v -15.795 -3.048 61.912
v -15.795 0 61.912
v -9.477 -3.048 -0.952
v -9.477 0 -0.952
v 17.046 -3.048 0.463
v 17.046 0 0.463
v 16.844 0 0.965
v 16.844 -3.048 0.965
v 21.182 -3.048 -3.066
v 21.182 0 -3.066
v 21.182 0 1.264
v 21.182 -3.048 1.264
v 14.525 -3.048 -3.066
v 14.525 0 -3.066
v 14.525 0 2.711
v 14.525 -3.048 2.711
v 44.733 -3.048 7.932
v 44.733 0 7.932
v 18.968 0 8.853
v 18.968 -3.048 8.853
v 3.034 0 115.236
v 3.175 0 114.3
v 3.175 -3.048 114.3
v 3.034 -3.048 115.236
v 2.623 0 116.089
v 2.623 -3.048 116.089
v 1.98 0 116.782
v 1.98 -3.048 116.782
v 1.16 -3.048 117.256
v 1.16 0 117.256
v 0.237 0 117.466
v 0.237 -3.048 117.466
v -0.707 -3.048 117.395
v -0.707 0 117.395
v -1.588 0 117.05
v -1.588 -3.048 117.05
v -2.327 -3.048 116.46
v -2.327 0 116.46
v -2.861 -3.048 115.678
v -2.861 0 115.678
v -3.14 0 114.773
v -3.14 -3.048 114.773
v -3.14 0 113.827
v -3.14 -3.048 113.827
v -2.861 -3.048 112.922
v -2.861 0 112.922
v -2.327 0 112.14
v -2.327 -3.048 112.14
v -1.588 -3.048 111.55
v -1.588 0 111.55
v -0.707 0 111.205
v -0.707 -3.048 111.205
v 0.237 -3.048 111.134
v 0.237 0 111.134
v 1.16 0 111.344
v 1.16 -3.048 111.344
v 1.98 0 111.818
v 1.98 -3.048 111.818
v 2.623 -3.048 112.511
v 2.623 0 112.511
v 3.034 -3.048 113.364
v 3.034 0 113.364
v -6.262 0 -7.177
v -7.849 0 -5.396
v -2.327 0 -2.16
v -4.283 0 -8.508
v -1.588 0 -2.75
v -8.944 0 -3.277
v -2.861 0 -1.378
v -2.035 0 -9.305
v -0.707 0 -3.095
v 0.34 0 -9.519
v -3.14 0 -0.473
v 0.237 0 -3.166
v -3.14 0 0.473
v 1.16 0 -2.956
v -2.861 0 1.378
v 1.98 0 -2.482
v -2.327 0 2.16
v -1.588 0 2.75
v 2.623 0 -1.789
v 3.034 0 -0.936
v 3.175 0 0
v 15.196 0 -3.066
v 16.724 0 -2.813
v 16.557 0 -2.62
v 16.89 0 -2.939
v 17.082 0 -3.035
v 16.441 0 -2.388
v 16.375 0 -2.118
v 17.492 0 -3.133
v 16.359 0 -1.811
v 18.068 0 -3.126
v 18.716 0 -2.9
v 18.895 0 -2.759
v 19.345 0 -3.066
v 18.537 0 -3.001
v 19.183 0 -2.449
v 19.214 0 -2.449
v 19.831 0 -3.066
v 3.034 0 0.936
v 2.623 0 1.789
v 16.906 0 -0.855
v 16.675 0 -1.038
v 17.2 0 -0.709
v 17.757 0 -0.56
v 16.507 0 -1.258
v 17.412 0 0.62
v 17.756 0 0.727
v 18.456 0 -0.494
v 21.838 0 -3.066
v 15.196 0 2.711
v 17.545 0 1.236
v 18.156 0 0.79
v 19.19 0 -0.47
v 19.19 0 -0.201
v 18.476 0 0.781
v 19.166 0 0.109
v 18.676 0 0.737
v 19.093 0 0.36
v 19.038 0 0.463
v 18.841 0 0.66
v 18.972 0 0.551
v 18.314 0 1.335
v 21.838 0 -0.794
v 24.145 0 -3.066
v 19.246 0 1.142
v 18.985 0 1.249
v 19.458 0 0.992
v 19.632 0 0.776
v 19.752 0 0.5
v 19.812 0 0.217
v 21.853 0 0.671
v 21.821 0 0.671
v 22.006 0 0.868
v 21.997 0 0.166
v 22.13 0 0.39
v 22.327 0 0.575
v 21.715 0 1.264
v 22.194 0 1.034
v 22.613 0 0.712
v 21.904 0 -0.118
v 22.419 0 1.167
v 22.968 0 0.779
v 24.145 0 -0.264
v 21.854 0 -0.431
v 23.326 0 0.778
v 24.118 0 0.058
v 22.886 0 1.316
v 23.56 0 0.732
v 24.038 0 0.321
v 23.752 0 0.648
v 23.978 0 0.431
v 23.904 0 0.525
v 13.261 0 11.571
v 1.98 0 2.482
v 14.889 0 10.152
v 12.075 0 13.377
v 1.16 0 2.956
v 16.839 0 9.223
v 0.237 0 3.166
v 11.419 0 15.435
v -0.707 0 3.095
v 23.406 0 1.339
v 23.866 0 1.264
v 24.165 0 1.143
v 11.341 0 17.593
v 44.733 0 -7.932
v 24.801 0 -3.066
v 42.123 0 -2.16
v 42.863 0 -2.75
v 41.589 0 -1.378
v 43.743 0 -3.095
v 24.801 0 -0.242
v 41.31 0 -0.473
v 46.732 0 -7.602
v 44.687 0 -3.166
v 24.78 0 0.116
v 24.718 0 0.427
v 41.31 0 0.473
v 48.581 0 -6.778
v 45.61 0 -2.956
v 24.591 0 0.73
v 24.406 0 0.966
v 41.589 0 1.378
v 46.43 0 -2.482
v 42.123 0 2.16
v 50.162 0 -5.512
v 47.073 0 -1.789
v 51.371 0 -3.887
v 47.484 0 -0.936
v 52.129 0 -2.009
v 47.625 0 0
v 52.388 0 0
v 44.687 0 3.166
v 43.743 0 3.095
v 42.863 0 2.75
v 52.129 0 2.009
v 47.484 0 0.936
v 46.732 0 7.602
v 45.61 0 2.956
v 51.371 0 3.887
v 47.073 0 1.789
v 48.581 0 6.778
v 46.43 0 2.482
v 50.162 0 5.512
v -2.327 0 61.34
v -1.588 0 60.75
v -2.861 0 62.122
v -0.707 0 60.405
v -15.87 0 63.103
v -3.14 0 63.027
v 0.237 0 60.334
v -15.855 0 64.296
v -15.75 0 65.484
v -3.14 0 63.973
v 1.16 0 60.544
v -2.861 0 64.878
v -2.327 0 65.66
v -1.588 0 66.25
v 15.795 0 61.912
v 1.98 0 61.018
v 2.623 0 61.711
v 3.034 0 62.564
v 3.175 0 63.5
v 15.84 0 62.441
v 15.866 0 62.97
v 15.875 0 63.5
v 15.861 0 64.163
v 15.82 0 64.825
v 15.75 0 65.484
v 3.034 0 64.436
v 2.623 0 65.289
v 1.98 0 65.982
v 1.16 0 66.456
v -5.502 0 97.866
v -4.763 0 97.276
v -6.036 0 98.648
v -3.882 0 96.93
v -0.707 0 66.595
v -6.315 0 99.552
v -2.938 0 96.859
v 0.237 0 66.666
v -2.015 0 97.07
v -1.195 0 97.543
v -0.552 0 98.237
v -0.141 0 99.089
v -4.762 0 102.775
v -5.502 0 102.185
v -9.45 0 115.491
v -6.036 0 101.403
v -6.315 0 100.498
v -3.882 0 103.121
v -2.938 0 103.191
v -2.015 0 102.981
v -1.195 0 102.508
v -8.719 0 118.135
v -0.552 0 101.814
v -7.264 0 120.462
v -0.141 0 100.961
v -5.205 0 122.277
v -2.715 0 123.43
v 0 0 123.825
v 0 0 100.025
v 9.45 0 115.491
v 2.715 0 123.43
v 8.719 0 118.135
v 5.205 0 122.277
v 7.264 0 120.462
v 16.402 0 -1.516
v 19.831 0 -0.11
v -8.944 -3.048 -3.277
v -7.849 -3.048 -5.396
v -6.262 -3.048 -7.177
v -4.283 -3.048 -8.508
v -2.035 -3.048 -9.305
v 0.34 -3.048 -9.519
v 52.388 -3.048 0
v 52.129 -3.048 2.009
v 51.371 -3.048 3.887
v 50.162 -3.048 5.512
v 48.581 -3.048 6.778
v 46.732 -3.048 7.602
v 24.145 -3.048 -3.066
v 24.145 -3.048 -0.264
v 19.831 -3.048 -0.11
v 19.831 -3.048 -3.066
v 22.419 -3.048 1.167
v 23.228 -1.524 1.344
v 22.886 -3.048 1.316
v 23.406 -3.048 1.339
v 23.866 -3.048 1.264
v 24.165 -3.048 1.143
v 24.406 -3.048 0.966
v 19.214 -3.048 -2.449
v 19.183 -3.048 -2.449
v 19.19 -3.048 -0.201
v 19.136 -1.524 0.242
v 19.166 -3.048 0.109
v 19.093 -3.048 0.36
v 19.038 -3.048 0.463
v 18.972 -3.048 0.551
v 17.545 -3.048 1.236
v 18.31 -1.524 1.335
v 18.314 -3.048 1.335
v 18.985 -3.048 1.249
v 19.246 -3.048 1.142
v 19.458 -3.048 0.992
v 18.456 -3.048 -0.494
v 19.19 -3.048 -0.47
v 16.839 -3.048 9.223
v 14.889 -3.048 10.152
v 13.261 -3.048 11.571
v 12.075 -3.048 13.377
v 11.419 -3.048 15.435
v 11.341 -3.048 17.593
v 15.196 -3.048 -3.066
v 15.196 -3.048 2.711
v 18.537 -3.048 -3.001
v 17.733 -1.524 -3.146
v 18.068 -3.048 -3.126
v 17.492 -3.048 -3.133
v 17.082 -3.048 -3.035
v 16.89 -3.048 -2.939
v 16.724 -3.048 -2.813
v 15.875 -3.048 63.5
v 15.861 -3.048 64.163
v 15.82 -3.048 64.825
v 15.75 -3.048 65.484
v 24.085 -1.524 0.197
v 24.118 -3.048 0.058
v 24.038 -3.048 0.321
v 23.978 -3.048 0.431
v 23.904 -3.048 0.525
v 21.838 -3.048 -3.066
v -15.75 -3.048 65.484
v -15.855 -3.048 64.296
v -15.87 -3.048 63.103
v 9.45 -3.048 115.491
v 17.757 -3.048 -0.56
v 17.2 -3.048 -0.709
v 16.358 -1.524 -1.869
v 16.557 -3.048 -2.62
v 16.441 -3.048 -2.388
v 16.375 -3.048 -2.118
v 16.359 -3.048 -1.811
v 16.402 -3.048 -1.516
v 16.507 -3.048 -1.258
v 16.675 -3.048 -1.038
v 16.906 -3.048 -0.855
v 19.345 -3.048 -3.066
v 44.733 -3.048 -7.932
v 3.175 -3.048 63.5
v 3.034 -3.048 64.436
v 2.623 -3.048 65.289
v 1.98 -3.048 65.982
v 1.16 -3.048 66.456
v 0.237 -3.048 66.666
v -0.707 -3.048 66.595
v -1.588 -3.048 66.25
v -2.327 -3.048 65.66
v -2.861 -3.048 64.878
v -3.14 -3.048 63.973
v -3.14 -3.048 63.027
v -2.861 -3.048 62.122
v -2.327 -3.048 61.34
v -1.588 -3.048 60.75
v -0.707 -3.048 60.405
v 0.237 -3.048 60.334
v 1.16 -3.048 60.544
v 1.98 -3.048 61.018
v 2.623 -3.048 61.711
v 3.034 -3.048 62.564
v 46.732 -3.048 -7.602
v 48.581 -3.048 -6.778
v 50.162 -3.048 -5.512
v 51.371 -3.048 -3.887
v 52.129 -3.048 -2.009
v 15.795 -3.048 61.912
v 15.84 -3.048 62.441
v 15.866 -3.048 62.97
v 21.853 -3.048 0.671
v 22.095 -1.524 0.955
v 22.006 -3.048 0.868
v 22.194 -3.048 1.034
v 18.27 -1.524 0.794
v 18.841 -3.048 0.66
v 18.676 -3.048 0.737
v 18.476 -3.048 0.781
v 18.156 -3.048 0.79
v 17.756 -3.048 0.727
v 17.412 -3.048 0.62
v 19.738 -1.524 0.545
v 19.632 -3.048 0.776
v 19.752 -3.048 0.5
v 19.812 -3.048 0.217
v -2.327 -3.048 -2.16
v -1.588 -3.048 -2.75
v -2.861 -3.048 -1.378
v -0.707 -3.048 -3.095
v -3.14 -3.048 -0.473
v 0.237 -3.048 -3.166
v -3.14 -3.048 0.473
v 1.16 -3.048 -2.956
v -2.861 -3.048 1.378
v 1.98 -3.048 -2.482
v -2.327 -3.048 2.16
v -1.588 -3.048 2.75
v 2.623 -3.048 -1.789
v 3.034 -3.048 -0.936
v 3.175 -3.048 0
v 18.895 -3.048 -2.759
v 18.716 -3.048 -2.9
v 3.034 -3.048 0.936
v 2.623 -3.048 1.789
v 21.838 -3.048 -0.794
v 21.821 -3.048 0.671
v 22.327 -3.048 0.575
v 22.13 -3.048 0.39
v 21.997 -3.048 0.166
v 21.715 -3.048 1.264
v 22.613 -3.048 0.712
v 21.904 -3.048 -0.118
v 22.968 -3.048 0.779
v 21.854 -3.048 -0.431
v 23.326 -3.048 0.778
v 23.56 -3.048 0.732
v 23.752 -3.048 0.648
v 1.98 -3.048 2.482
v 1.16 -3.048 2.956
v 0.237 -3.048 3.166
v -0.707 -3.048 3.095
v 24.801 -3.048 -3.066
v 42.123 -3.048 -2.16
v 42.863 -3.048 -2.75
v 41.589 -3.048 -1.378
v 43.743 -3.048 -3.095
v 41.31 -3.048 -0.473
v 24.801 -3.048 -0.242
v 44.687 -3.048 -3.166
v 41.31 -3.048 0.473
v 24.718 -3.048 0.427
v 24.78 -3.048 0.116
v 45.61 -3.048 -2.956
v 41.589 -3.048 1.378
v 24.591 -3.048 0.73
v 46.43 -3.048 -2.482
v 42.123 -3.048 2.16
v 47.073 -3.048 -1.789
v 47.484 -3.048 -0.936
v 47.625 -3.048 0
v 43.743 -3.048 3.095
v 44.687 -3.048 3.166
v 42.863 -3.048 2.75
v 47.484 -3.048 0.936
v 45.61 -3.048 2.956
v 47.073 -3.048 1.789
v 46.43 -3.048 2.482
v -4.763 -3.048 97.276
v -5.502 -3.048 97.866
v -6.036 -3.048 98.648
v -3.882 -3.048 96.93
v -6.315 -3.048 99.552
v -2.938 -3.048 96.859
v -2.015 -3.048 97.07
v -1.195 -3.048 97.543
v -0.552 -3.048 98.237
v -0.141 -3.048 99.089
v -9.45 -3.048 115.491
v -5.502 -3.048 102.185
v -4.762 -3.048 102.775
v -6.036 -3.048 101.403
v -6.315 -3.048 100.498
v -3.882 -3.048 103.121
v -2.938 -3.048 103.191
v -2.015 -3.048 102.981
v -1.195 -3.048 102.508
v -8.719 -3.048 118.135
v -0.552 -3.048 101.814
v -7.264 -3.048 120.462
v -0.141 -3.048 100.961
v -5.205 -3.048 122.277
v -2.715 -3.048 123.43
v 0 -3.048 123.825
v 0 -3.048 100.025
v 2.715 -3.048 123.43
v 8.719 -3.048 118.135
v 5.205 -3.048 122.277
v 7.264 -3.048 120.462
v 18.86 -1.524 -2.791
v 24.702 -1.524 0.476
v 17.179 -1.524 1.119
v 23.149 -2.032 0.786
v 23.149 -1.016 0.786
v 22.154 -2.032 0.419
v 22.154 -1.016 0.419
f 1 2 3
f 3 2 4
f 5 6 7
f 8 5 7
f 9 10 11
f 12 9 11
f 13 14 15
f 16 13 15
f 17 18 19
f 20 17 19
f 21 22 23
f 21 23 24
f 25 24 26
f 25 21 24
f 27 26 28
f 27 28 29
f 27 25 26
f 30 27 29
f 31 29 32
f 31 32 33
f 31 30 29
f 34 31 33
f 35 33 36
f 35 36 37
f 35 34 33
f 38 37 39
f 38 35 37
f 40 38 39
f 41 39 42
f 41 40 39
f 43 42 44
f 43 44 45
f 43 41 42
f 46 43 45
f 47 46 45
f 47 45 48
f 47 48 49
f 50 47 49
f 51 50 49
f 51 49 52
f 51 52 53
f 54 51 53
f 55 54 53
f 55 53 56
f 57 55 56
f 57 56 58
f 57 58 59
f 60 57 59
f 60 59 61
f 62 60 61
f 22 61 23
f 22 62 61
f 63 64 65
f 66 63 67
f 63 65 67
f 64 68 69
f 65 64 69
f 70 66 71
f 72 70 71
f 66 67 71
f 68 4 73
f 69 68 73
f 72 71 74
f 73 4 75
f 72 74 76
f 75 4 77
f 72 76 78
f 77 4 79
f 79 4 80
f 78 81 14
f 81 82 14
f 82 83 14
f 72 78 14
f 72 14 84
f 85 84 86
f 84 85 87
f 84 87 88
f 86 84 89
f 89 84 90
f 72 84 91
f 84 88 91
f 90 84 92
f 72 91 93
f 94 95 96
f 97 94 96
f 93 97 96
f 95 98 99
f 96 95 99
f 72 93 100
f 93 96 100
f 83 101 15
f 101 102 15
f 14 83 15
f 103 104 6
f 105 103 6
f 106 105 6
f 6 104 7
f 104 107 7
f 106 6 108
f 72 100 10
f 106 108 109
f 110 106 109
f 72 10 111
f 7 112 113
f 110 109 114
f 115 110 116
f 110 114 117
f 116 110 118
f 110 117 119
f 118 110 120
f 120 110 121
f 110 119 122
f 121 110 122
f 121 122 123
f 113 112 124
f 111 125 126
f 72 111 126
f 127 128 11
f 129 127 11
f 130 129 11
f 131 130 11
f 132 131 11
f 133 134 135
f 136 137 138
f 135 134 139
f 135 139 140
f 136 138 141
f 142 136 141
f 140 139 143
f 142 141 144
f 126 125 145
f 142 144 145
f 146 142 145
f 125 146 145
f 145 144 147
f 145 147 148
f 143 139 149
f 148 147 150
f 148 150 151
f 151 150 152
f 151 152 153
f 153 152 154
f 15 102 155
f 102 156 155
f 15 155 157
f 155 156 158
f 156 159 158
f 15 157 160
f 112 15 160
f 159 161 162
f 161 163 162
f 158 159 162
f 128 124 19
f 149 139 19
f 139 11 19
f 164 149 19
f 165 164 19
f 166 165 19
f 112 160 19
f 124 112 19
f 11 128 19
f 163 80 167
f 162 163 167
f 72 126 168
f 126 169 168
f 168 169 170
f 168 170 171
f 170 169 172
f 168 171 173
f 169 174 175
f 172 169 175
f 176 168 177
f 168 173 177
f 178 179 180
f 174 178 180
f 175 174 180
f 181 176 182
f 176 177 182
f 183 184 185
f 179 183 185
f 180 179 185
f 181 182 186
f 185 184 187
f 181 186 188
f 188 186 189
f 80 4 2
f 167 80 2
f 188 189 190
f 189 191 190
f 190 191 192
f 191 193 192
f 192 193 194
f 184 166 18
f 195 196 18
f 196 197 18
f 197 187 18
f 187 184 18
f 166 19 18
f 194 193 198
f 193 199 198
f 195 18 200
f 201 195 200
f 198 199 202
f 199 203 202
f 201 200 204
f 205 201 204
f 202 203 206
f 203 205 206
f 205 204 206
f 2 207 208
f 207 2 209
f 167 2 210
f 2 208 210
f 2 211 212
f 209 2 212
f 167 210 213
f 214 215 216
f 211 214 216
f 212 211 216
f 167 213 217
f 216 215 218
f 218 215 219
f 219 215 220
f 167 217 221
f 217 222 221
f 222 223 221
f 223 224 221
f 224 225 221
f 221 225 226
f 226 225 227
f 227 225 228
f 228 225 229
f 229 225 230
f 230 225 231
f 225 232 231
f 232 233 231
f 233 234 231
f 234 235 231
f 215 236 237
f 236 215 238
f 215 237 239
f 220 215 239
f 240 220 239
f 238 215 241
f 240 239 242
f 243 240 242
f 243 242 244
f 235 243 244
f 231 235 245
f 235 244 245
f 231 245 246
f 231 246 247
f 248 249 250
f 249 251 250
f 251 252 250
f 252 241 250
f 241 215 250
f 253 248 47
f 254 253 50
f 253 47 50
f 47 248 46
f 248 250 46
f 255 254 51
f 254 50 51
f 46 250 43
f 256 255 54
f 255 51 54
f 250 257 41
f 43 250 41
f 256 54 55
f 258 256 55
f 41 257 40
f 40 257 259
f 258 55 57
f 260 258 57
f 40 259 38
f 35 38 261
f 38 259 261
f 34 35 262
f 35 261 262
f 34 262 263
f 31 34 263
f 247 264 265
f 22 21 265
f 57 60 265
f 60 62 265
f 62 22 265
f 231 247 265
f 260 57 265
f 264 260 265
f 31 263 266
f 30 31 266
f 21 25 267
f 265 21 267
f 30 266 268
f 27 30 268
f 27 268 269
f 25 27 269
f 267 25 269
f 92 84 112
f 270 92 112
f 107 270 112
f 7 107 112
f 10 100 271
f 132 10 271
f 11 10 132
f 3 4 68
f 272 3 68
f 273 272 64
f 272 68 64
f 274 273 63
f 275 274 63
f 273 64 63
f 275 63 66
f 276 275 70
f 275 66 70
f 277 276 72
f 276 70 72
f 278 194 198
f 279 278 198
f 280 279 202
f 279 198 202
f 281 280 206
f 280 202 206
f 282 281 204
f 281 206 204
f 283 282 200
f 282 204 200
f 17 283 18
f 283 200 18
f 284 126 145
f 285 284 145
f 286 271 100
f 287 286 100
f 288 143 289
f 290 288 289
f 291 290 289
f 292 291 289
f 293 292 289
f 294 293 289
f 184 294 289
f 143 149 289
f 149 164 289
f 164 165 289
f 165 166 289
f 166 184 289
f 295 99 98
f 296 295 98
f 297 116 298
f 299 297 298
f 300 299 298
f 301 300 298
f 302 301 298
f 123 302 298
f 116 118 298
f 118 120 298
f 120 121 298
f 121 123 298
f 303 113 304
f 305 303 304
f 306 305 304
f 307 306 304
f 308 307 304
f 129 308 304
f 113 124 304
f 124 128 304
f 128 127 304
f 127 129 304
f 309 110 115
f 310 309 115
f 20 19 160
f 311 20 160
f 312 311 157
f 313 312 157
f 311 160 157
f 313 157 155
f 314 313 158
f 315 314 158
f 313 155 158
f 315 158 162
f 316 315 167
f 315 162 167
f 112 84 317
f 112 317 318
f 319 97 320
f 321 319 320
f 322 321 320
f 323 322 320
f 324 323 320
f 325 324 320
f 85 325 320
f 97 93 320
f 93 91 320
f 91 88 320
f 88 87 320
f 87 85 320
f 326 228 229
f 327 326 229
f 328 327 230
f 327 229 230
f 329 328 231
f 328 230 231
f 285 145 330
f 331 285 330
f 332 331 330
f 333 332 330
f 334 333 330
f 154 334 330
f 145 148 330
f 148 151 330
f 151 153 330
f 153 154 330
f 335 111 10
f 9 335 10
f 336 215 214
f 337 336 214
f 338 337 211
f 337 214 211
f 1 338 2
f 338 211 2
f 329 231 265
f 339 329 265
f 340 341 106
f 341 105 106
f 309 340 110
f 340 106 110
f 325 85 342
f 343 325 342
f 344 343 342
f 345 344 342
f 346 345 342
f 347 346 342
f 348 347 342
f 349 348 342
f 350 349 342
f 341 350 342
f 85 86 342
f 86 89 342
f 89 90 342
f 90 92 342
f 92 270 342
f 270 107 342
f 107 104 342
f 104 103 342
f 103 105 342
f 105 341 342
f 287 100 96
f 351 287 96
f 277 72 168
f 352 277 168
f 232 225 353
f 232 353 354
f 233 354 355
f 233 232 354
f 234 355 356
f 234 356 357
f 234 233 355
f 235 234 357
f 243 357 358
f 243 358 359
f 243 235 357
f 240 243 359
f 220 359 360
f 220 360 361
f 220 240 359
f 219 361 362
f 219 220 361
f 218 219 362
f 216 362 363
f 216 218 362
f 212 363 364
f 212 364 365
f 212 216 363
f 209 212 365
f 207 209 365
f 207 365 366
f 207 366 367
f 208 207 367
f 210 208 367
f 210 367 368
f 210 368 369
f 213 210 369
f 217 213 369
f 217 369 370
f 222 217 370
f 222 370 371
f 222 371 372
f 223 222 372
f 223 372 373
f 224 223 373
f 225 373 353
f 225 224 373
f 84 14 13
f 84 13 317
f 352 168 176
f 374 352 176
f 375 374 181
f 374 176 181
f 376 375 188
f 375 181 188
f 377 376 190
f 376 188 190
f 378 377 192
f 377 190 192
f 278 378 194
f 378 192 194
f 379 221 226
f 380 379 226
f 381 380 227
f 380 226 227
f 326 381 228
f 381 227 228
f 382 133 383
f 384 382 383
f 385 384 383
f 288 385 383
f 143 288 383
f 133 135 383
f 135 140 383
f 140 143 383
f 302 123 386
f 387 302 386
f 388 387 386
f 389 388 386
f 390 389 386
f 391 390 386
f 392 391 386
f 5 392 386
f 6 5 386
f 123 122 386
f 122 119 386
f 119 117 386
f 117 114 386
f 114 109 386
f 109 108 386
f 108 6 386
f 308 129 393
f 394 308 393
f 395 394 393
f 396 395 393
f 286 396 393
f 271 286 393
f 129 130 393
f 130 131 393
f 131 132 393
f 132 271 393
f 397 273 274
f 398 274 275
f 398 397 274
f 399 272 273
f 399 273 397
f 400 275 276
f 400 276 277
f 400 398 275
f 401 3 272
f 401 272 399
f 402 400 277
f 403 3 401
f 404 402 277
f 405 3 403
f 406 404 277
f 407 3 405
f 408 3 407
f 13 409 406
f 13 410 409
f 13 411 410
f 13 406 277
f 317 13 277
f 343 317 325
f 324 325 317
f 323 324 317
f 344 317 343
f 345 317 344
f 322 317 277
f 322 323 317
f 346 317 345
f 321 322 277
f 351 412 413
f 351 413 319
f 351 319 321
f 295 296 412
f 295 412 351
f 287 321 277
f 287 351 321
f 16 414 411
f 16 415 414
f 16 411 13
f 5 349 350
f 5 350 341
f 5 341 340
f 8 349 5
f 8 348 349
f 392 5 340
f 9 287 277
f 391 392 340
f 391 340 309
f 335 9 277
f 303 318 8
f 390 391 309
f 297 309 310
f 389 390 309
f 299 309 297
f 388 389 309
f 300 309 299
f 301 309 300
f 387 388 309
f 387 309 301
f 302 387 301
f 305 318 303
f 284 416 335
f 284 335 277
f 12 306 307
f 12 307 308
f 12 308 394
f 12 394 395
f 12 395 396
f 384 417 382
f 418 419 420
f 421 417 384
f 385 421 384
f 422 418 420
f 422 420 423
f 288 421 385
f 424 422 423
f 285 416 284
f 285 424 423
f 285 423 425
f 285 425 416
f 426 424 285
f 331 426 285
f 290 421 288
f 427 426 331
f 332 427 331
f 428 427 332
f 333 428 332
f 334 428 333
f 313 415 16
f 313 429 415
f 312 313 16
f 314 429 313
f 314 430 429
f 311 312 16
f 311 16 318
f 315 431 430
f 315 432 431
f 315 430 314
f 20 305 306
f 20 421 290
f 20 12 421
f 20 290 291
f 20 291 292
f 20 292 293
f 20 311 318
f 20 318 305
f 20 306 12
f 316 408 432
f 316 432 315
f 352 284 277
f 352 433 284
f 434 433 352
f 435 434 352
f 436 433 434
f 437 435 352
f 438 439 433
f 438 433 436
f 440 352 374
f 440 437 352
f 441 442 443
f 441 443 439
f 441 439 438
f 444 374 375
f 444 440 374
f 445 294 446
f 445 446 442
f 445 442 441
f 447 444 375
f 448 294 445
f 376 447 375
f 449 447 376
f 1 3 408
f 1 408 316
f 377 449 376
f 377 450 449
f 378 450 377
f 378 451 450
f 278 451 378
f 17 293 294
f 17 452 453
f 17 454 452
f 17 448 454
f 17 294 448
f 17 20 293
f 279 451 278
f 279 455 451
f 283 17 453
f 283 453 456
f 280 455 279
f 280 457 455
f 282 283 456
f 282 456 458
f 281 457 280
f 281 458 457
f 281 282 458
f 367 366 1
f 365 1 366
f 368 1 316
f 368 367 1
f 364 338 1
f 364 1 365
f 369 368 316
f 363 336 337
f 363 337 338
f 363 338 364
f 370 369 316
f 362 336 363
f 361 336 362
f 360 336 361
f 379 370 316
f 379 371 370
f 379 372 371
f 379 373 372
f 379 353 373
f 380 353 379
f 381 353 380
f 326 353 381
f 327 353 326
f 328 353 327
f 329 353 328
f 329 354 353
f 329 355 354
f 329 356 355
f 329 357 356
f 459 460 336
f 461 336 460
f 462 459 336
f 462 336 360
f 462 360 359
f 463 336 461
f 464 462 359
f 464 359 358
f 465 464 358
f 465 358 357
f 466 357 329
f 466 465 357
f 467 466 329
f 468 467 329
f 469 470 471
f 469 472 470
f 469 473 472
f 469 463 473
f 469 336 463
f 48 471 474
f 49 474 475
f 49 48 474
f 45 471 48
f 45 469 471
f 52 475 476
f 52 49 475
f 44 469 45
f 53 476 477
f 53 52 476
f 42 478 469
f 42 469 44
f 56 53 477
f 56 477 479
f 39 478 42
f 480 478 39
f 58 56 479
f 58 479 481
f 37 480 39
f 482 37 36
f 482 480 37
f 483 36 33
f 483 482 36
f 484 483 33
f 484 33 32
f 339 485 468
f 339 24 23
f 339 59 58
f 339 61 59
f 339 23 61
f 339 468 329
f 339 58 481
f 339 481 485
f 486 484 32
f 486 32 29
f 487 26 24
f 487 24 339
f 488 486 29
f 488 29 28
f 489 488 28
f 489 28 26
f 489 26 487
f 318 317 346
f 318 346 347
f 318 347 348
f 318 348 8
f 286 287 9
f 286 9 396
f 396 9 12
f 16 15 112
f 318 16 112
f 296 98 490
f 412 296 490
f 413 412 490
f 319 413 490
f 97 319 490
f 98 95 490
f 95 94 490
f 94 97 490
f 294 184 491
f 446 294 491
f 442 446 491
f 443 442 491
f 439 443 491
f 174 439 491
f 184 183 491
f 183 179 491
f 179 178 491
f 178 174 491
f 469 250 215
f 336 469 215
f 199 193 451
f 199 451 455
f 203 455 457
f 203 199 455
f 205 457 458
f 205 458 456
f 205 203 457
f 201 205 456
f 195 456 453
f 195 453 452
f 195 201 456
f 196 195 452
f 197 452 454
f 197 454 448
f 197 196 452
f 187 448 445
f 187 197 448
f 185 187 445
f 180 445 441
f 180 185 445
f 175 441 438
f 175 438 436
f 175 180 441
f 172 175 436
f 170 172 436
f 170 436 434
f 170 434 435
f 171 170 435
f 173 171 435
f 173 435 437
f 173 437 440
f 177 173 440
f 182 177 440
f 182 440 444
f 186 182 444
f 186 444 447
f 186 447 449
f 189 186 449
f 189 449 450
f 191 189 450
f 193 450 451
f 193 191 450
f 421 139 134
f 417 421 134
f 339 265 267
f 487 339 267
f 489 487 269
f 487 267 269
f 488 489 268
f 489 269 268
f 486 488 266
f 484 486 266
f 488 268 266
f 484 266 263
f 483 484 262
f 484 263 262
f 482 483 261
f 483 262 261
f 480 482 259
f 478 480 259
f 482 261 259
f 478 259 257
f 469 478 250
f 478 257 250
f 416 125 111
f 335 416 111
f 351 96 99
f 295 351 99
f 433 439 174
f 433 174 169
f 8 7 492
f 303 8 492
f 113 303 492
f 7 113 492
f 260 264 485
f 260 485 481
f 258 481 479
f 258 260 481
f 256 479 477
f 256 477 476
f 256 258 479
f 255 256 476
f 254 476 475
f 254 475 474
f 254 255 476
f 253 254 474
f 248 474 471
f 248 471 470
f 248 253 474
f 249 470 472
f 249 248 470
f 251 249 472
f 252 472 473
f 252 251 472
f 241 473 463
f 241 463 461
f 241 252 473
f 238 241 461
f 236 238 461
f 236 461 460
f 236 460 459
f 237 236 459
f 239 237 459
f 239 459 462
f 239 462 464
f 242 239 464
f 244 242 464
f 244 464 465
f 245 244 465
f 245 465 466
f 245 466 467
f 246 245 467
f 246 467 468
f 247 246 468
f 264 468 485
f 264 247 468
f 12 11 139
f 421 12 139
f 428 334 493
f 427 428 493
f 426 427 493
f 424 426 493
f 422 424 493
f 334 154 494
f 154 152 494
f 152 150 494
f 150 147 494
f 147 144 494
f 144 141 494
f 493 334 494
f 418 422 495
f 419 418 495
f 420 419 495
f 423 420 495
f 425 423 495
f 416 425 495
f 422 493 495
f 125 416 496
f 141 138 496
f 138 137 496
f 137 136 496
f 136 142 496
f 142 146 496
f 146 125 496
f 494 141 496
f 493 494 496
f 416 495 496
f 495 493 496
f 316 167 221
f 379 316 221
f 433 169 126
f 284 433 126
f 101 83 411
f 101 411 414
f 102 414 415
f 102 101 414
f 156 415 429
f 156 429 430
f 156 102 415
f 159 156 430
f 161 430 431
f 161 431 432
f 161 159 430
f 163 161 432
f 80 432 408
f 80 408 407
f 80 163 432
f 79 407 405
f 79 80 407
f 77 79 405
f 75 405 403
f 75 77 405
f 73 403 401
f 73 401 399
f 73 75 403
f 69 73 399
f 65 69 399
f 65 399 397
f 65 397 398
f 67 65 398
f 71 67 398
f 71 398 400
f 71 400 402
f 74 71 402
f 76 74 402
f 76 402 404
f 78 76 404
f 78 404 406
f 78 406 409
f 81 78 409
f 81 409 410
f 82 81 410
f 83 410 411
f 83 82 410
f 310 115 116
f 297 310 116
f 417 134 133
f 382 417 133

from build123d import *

# Parameters (mm, degrees)
F0_R     = 3.175
F0_W     = 0.6713387143
F0_H     = 5.7765472419
F1_DEPTH = 3.048


with BuildPart() as f1:
    # F0 (on Front) → F1 (new body)
    with BuildSketch(Plane.XZ):
        with BuildLine():
            ThreePointArc((0.3401785714, -9.5189234444), (6.8544082857, -6.6138273378), (9.525, 0))
            ThreePointArc((9.525, 0), (-0.4768479324, 9.5130563464), (-9.4772553384, -0.9525))
            ThreePointArc((-9.4772553384, -0.9525), (-6.2623833816, -7.1769199091), (0.3401785714, -9.5189234444))
        make_face()
        Circle(F0_R, mode=Mode.SUBTRACT)
        with BuildLine():
            ThreePointArc((-9.4772553384, -0.9525), (-0.4768479324, 9.5130563464), (9.525, 0))
            ThreePointArc((9.525, 0), (6.8544082857, -6.6138273378), (0.3401785714, -9.5189234444))
            Line((0.3401785714, -9.5189234444), (44.7334821429, -7.9324362036))
            ThreePointArc((44.7334821429, -7.9324362036), (36.5125, 0), (44.7334821429, 7.9324362036))
            Line((44.7334821429, 7.9324362036), (18.9676000005, 8.8532337108))
            ThreePointArc((18.9676000005, 8.8532337108), (13.2611998974, 11.5713591498), (11.3411865923, 17.5933818124))
            Line((11.3411865923, 17.5933818124), (15.7954255641, 61.9125))
            ThreePointArc((15.7954255641, 61.9125), (0, 47.625), (-15.7954255641, 61.9125))
            Line((-15.7954255641, 61.9125), (-9.4772553384, -0.9525))
        make_face()
        with Locations((14.8607160592, -0.1777730082)):
            Rectangle(F0_W, F0_H, mode=Mode.SUBTRACT)
        with BuildLine():
            Line((19.8312775565, -3.0660466291), (19.3445253814, -3.0660466291))
            Line((19.3445253814, -3.0660466291), (19.2143033709, -2.4490724435))
            Line((19.2143033709, -2.4490724435), (19.1826960868, -2.4490724435))
            add(Edge.make_bspline(
                [(19.1826960868, -2.4490724435), (18.8590374977, -2.8561742627), (18.5372753455, -3.0009356239)],
                knots=[0, 0, 0, 1, 1, 1], degree=2))
            add(Edge.make_bspline(
                [(18.5372753455, -3.0009356239), (18.2155131934, -3.145696985), (17.7325538924, -3.145696985)],
                knots=[0, 0, 0, 1, 1, 1], degree=2))
            add(Edge.make_bspline(
                [(17.7325538924, -3.145696985), (17.0890295881, -3.145696985), (16.7236493839, -2.8131883563)],
                knots=[0, 0, 0, 1, 1, 1], degree=2))
            add(Edge.make_bspline(
                [(16.7236493839, -2.8131883563), (16.3582691798, -2.4806797276), (16.3582691798, -1.8687627074)],
                knots=[0, 0, 0, 1, 1, 1], degree=2))
            add(Edge.make_bspline(
                [(16.3582691798, -1.8687627074), (16.3582691798, -0.557692563), (18.4557285526, -0.4944779948)],
                knots=[0, 0, 0, 1, 1, 1], degree=2))
            Line((18.4557285526, -0.4944779948), (19.190281835, -0.4704564589))
            Line((19.190281835, -0.4704564589), (19.190281835, -0.2011623984))
            add(Edge.make_bspline(
                [(19.190281835, -0.2011623984), (19.190281835, 0.3083470213), (18.971559429, 0.5510909631)],
                knots=[0, 0, 0, 1, 1, 1], degree=2))
            add(Edge.make_bspline(
                [(18.971559429, 0.5510909631), (18.7528370231, 0.793834905), (18.2698777221, 0.793834905)],
                knots=[0, 0, 0, 1, 1, 1], degree=2))
            add(Edge.make_bspline(
                [(18.2698777221, 0.793834905), (17.7287610183, 0.793834905), (17.0460436818, 0.4625905677)],
                knots=[0, 0, 0, 1, 1, 1], degree=2))
            Line((17.0460436818, 0.4625905677), (16.8437570635, 0.9645142392))
            add(Edge.make_bspline(
                [(16.8437570635, 0.9645142392), (17.1636227786, 1.137722156), (17.5448066248, 1.2363368824)],
                knots=[0, 0, 0, 1, 1, 1], degree=2))
            add(Edge.make_bspline(
                [(17.5448066248, 1.2363368824), (17.9259904711, 1.3349516088), (18.3103350457, 1.3349516088)],
                knots=[0, 0, 0, 1, 1, 1], degree=2))
            add(Edge.make_bspline(
                [(18.3103350457, 1.3349516088), (19.0840813604, 1.3349516088), (19.4576794585, 0.9916965035)],
                knots=[0, 0, 0, 1, 1, 1], degree=2))
            add(Edge.make_bspline(
                [(19.4576794585, 0.9916965035), (19.8312775565, 0.6484413982), (19.8312775565, -0.1101334202)],
                knots=[0, 0, 0, 1, 1, 1], degree=2))
            Line((19.8312775565, -0.1101334202), (19.8312775565, -3.0660466291))
        make_face(mode=Mode.SUBTRACT)
        with BuildLine():
            Line((24.8012069082, -3.0660466291), (24.1450396903, -3.0660466291))
            Line((24.1450396903, -3.0660466291), (24.1450396903, -0.2643769666))
            add(Edge.make_bspline(
                [(24.1450396903, -0.2643769666), (24.1450396903, 0.2640968235), (23.9041921855, 0.5251729902)],
                knots=[0, 0, 0, 1, 1, 1], degree=2))
            add(Edge.make_bspline(
                [(23.9041921855, 0.5251729902), (23.6633446806, 0.7862491568), (23.1487780955, 0.7862491568)],
                knots=[0, 0, 0, 1, 1, 1], degree=2))
            add(Edge.make_bspline(
                [(23.1487780955, 0.7862491568), (22.4698536331, 0.7862491568), (22.1537807921, 0.4189725156)],
                knots=[0, 0, 0, 1, 1, 1], degree=2))
            add(Edge.make_bspline(
                [(22.1537807921, 0.4189725156), (21.8377079511, 0.0516958744), (21.8377079511, -0.7941150481)],
                knots=[0, 0, 0, 1, 1, 1], degree=2))
            Line((21.8377079511, -0.7941150481), (21.8377079511, -3.0660466291))
            Line((21.8377079511, -3.0660466291), (21.1815407332, -3.0660466291))
            Line((21.1815407332, -3.0660466291), (21.1815407332, 1.2641512924))
            Line((21.1815407332, 1.2641512924), (21.7150716888, 1.2641512924))
            Line((21.7150716888, 1.2641512924), (21.8212721634, 0.6711986427))
            Line((21.8212721634, 0.6711986427), (21.8528794475, 0.6711986427))
            add(Edge.make_bspline(
                [(21.8528794475, 0.6711986427), (22.0551660657, 0.9910643578), (22.4186498328, 1.1674330031)],
                knots=[0, 0, 0, 1, 1, 1], degree=2))
            add(Edge.make_bspline(
                [(22.4186498328, 1.1674330031), (22.7821336, 1.3438016483), (23.2284284515, 1.3438016483)],
                knots=[0, 0, 0, 1, 1, 1], degree=2))
            add(Edge.make_bspline(
                [(23.2284284515, 1.3438016483), (24.0110248057, 1.3438016483), (24.406115857, 0.9664106762)],
                knots=[0, 0, 0, 1, 1, 1], degree=2))
            add(Edge.make_bspline(
                [(24.406115857, 0.9664106762), (24.8012069082, 0.5890197041), (24.8012069082, -0.241619722)],
                knots=[0, 0, 0, 1, 1, 1], degree=2))
            Line((24.8012069082, -0.241619722), (24.8012069082, -3.0660466291))
        make_face(mode=Mode.SUBTRACT)
        with BuildLine():
            ThreePointArc((-15.7504882737, 65.484375), (-15.8737438155, 63.6997054867), (-15.7954255641, 61.9125))
            ThreePointArc((-15.7954255641, 61.9125), (0, 47.625), (15.7954255641, 61.9125))
            ThreePointArc((15.7954255641, 61.9125), (15.8550939106, 62.7052534459), (15.875, 63.5))
            ThreePointArc((15.875, 63.5), (15.8438414904, 64.4941387366), (15.7504882737, 65.484375))
            ThreePointArc((15.7504882737, 65.484375), (0, 79.375), (-15.7504882737, 65.484375))
        make_face()
        with Locations((0, 63.5)):
            Circle(F0_R, mode=Mode.SUBTRACT)
        with BuildLine():
            ThreePointArc((44.7334821429, 7.9324362036), (36.5125, 0), (44.7334821429, -7.9324362036))
            ThreePointArc((44.7334821429, -7.9324362036), (50.1620069047, -5.5115227815), (52.3875, 0))
            ThreePointArc((52.3875, 0), (50.1620069047, 5.5115227815), (44.7334821429, 7.9324362036))
        make_face()
        with Locations((44.45, 0)):
            Circle(F0_R, mode=Mode.SUBTRACT)
        with BuildLine():
            Line((-9.4502929642, 115.490625), (-15.7504882737, 65.484375))
            ThreePointArc((-15.7504882737, 65.484375), (0, 79.375), (15.7504882737, 65.484375))
            Line((15.7504882737, 65.484375), (9.4502929642, 115.490625))
            ThreePointArc((9.4502929642, 115.490625), (9.5063048942, 114.896483242), (9.525, 114.3))
            ThreePointArc((9.525, 114.3), (-0.596483242, 104.7936951058), (-9.4502929642, 115.490625))
        make_face()
        with Locations((-3.175, 100.0252)):
            Circle(F0_R, mode=Mode.SUBTRACT)
        with BuildLine():
            ThreePointArc((9.4502929642, 115.490625), (0, 123.825), (-9.4502929642, 115.490625))
            ThreePointArc((-9.4502929642, 115.490625), (-0.596483242, 104.7936951058), (9.525, 114.3))
            ThreePointArc((9.525, 114.3), (9.5063048942, 114.896483242), (9.4502929642, 115.490625))
        make_face()
        with Locations((0, 114.3)):
            Circle(F0_R, mode=Mode.SUBTRACT)
    extrude(amount=F1_DEPTH)


solid = f1.part
